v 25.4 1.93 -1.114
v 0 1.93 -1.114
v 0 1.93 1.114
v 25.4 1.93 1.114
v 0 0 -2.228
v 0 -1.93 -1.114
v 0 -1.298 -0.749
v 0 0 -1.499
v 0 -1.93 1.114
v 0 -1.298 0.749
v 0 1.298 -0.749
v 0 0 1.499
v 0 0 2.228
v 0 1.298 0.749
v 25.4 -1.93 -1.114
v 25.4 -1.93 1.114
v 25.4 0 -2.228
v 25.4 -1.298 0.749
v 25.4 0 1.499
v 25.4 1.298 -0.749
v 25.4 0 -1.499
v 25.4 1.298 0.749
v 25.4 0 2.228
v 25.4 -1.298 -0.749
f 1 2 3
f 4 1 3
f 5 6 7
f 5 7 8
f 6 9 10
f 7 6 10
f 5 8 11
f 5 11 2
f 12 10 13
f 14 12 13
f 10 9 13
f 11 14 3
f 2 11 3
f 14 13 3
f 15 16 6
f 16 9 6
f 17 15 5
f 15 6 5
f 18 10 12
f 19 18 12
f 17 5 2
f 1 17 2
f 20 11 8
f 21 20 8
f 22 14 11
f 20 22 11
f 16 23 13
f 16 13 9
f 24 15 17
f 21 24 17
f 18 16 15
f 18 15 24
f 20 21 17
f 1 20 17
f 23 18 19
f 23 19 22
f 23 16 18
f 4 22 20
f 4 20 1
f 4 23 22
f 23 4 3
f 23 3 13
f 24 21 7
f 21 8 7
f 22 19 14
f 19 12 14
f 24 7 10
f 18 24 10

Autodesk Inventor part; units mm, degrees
ref_plane "YZ Plane" through (0, 0, 0) normal (1, 0, 0) x (0, 1, 0)
ref_plane "XZ Plane" through (0, 0, 0) normal (0, 1, 0) x (-1, 0, 0)
ref_plane "XY Plane" through (0, 0, 0) normal (0, 0, 1) x (1, 0, 0)
sketch "Sketch1" plane through (0, 0, 0) normal (1, 0, 0) x (0, 1, 0)
  line L0 (0, -1.4986) -> (-1.2978, -0.7493)
  line L1 (-1.2978, -0.7493) -> (-1.2978, 0.7493)
  line L2 (-1.2978, 0.7493) -> (0, 1.4986)
  line L3 (0, 1.4986) -> (1.2978, 0.7493)
  line L4 (1.2978, 0.7493) -> (1.2978, -0.7493)
  line L5 (1.2978, -0.7493) -> (0, -1.4986)
  line L6 (1.9295, -1.114) -> (1.9295, 1.114)
  line L7 (1.9295, 1.114) -> (0, 2.228)
  line L8 (0, 2.228) -> (-1.9295, 1.114)
  line L9 (-1.9295, 1.114) -> (-1.9295, -1.114)
  line L10 (-1.9295, -1.114) -> (0, -2.228)
  line L11 (0, -2.228) -> (1.9295, -1.114)
  point P0 (0, 0)
  point P1 (0, 0)
  dimension "d0" = 1.4986
extrude "Extrusion1" add sketch "Sketch1" along normal blind 25.4
properties part number "Metal Fastener"
